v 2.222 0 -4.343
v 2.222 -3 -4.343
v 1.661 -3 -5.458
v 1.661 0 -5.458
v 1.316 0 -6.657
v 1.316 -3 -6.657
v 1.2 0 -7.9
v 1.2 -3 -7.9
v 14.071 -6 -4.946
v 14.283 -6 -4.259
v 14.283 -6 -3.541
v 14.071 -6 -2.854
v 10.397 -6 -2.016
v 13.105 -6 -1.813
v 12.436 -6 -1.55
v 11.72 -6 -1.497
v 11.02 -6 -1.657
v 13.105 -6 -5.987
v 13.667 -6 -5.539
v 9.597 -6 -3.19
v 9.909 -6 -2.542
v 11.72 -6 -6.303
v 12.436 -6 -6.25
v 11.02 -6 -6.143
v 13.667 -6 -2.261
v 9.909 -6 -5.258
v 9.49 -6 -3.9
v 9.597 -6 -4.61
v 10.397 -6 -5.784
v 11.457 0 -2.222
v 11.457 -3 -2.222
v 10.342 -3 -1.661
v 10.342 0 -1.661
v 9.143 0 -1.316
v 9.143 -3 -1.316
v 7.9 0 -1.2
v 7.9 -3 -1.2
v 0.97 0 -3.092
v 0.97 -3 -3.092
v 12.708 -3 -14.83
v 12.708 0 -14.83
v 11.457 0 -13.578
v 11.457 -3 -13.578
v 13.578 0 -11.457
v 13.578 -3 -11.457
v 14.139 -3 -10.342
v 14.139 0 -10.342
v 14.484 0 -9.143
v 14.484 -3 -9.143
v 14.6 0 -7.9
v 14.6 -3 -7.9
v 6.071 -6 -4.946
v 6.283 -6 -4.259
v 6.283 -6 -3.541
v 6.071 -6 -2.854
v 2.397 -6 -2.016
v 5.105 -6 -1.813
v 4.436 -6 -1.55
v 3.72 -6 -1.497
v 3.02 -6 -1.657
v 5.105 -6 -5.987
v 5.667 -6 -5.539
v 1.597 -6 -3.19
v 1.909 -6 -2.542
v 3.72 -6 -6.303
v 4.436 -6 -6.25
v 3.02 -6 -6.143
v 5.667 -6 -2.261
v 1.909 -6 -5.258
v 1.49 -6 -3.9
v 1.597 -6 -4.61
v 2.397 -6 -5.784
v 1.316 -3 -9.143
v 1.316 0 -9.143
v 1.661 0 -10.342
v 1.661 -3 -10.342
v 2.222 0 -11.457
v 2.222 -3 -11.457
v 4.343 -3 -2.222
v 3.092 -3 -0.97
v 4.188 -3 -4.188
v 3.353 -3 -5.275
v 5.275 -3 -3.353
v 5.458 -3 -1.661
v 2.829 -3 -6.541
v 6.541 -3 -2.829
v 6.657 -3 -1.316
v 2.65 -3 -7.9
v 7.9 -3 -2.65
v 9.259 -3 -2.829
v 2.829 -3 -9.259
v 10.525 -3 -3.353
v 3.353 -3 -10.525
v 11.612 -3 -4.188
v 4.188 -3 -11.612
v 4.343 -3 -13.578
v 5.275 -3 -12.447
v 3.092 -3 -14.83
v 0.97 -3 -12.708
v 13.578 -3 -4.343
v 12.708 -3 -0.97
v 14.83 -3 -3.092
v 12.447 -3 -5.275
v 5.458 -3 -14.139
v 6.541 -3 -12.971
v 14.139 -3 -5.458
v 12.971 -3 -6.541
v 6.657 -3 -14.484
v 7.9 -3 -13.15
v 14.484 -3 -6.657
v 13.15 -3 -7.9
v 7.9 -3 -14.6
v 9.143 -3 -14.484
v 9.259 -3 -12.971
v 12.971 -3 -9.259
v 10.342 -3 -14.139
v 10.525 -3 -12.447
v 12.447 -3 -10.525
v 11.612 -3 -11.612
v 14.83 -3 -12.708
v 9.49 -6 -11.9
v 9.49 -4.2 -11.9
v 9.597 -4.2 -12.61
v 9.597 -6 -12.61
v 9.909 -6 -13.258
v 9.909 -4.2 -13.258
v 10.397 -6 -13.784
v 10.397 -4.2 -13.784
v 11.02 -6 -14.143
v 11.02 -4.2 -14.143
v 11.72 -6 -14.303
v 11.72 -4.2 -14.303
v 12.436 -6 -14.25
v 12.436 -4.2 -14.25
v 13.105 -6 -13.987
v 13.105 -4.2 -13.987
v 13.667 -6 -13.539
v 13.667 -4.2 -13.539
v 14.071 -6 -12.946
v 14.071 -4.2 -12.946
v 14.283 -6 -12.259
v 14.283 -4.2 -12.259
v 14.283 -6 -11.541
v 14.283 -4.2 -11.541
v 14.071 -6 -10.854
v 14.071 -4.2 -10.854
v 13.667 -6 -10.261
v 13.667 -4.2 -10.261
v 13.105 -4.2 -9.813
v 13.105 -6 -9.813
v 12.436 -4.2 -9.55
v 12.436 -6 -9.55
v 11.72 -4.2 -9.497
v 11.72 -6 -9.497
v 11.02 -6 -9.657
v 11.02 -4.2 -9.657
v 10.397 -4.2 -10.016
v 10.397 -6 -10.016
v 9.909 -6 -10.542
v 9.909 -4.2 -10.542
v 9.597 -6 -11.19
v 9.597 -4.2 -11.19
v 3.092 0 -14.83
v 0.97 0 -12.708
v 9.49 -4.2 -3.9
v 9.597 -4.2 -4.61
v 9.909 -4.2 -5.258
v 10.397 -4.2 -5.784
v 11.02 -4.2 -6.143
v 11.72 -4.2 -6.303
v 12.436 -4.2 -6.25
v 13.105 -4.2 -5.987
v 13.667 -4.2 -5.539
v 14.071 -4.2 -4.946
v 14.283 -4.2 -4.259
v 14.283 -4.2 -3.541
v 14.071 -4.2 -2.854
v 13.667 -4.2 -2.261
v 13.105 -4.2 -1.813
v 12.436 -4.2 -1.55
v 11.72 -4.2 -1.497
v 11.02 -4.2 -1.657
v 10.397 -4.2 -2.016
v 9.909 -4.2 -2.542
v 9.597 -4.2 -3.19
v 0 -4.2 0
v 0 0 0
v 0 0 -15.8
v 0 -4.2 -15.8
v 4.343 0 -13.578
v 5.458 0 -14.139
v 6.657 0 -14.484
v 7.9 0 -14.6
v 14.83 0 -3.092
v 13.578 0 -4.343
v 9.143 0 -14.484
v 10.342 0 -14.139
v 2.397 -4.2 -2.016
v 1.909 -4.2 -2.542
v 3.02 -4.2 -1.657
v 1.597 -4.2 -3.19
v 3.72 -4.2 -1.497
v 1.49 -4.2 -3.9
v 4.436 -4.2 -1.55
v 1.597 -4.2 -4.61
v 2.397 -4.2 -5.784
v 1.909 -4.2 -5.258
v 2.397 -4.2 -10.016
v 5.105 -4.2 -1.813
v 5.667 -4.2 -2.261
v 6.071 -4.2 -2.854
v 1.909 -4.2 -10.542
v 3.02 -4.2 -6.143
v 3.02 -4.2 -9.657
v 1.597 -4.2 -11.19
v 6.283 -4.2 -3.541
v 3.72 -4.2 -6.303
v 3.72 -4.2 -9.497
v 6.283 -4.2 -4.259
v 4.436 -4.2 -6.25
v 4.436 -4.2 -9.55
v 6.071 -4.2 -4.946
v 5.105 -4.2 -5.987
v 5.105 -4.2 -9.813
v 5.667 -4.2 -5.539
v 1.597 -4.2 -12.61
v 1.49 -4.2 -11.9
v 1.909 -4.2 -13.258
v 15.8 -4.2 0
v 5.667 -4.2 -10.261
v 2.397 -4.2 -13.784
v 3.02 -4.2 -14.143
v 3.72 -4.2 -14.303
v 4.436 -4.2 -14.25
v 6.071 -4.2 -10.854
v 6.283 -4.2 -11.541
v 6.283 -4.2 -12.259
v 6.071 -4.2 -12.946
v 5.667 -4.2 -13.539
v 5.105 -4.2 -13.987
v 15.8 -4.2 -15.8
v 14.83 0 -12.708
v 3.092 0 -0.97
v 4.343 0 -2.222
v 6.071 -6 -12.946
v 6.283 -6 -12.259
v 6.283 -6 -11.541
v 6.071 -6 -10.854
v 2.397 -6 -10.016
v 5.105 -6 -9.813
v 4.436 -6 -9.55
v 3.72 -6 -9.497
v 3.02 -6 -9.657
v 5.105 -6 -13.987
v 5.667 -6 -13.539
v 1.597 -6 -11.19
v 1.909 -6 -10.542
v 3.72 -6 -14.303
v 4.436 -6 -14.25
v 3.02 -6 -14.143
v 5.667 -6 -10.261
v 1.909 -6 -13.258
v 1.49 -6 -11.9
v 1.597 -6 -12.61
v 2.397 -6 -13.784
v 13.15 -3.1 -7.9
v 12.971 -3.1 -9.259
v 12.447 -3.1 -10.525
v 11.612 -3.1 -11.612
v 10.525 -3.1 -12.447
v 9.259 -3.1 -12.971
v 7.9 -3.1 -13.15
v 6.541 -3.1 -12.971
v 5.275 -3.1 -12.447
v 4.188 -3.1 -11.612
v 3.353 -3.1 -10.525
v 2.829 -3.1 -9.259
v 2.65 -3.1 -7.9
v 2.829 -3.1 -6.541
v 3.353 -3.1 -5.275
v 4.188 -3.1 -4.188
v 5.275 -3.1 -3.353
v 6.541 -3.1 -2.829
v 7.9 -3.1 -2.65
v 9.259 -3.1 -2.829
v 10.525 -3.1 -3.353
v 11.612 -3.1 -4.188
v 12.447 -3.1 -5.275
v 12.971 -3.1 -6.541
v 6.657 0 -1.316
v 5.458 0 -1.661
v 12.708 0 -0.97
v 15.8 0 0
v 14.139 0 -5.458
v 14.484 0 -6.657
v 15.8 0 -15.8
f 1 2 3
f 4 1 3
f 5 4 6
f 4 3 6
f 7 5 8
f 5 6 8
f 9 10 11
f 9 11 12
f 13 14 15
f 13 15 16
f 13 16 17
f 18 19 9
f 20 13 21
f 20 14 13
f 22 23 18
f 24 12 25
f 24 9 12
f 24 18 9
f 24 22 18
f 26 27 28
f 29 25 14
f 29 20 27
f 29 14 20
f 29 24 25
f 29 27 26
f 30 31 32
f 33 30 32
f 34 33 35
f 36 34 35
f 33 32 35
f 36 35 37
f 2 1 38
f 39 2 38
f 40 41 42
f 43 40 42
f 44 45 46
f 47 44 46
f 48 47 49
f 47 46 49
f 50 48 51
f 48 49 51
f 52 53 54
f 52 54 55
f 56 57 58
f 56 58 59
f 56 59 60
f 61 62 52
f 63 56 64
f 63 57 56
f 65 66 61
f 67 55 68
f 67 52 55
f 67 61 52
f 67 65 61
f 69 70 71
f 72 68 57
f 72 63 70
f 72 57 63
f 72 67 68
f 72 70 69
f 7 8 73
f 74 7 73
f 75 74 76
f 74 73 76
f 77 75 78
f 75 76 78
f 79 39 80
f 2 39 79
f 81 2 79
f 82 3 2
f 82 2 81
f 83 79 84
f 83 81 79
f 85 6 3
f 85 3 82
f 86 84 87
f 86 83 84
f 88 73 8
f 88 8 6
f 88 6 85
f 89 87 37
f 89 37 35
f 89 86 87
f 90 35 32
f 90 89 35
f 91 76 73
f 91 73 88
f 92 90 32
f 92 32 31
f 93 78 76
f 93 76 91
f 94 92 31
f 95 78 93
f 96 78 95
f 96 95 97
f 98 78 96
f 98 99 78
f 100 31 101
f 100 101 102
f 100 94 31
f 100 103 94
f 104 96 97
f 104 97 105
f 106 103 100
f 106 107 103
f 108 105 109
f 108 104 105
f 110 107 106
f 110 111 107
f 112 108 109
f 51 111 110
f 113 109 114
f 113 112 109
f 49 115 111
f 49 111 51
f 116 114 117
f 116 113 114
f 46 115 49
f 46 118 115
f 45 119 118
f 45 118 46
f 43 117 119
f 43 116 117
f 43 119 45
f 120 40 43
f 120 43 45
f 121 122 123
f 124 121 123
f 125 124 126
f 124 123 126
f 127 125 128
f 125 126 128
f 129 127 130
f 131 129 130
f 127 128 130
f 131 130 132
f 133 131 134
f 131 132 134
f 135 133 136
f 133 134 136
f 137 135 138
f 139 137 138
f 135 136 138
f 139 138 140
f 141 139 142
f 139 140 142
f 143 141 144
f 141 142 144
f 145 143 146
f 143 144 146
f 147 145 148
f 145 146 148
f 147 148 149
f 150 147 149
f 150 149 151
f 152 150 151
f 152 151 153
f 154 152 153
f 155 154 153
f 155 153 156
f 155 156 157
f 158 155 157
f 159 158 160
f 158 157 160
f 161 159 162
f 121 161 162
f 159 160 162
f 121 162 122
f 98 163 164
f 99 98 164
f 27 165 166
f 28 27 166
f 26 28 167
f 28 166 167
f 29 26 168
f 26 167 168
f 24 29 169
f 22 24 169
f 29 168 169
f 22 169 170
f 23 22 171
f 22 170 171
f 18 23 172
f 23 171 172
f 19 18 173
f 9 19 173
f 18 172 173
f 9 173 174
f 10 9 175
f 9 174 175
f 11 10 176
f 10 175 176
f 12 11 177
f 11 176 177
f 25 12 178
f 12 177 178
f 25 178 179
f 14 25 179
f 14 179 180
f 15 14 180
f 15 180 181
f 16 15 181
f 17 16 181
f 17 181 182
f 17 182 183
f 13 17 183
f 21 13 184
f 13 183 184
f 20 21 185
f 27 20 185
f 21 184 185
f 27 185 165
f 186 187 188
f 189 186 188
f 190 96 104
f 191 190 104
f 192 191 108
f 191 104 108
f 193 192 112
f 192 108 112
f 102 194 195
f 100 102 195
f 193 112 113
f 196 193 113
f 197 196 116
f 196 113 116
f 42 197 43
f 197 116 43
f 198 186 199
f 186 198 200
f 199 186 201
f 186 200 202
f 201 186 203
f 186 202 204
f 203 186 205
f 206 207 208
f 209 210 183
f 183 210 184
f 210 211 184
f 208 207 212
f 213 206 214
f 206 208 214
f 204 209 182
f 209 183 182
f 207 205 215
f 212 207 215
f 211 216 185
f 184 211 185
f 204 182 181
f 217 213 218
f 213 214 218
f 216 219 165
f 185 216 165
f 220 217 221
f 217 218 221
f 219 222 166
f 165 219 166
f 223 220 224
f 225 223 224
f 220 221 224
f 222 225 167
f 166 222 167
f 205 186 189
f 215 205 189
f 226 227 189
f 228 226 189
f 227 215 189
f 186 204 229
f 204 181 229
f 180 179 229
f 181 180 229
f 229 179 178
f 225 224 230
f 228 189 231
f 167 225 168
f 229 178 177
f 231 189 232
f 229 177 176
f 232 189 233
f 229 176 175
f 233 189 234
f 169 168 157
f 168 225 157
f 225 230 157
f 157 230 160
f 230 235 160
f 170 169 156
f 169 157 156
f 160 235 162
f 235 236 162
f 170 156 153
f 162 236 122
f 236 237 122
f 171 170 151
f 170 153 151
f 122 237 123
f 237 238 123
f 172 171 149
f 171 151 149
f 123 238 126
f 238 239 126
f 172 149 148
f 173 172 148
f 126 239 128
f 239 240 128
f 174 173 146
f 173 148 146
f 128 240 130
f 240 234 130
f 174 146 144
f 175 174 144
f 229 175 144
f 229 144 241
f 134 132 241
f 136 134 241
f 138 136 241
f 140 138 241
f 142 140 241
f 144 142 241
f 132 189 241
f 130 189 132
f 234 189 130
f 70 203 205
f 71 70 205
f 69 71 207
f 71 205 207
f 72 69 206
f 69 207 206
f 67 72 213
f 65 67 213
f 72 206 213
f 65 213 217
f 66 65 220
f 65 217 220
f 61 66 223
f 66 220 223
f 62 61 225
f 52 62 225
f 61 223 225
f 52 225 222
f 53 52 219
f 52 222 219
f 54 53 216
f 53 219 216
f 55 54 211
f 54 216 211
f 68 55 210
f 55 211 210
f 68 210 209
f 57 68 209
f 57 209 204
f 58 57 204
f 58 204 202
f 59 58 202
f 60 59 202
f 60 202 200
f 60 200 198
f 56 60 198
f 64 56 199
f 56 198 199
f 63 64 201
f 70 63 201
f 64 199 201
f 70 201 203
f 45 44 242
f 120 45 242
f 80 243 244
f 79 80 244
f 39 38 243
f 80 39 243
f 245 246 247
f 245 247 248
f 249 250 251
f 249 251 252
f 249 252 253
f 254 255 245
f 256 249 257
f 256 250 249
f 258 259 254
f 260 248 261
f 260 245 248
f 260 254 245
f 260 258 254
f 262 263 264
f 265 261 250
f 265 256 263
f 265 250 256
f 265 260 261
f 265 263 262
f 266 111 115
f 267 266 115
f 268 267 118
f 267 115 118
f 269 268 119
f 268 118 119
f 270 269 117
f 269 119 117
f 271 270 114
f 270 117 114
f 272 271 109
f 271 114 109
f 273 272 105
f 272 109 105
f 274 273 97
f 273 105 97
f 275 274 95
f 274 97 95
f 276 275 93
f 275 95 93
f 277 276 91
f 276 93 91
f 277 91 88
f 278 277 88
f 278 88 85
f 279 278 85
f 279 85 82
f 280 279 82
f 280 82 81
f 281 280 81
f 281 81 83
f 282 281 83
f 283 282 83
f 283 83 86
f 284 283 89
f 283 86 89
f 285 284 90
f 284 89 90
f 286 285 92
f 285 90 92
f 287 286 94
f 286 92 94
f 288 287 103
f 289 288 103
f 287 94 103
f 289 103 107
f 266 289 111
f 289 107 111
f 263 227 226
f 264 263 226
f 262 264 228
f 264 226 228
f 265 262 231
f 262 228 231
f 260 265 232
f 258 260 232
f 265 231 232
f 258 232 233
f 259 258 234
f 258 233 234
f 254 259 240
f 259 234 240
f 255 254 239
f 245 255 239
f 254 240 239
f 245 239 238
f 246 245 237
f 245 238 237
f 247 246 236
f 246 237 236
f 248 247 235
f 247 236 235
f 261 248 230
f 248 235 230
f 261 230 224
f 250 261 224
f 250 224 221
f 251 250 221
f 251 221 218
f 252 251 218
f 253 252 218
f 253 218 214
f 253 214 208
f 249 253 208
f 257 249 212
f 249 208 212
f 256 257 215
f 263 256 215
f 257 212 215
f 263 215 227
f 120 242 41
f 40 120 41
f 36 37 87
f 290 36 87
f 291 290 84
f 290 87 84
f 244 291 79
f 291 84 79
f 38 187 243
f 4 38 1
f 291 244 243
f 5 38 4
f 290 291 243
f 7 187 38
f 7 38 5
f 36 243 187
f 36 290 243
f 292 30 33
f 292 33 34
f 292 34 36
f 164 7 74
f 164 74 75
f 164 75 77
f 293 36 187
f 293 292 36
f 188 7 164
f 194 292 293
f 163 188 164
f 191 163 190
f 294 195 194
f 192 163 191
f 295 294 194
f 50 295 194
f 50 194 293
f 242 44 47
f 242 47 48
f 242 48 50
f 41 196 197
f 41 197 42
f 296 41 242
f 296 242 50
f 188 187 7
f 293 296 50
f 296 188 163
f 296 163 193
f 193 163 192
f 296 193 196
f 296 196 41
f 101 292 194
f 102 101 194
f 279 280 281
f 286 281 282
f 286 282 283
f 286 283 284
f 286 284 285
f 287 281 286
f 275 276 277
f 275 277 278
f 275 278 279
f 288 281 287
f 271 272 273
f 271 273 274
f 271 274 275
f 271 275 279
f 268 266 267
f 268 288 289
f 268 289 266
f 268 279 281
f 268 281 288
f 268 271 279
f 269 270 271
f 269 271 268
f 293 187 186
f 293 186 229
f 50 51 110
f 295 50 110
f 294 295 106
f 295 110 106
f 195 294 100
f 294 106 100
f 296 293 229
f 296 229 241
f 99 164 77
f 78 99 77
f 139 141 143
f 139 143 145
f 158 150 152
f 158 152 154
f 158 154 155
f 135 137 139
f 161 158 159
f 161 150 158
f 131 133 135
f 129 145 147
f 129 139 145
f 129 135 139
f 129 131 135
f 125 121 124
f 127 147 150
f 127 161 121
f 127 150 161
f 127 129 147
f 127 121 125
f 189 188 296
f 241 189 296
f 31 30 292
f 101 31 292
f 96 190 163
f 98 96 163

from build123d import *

# Parameters (mm, degrees)
SKETCH2_W            = 15.8
SKETCH2_H            = 15.8
BOSS_EXTRUDE2_DEPTH  = 4.2
SKETCH4_W            = 13.4
SKETCH4_H            = 13.4
CUT_EXTRUDE1_DEPTH   = 3
SKETCH6_R            = 2.41
BOSS_EXTRUDE4_DEPTH  = 1.8
LPATTERN1_COUNT      = 2
LPATTERN1_PITCH      = 8
LPATTERN1_COUNT_DIR2 = 2
LPATTERN1_PITCH_DIR2 = 8
SKETCH8_R            = 5.25
CUT_EXTRUDE2_DEPTH   = 0.1
BOSS_EXTRUDE9_DEPTH  = 3
CUT_EXTRUDE3_DEPTH   = 3
CIRPATTERN3_COUNT    = 4


with BuildPart() as part:
    # Sketch2 → Boss-Extrude2 (new body)
    with BuildSketch(Plane(origin=(0, 0, 0), x_dir=(1, 0, 0), z_dir=(0, 1, 0))):
        with Locations((7.9, 7.9)):
            Rectangle(SKETCH2_W, SKETCH2_H)
    extrude(amount=-BOSS_EXTRUDE2_DEPTH)

    # Sketch4 → Cut-Extrude1 (cut)
    with BuildSketch(Plane(origin=(0, 0, 0), x_dir=(1, 0, 0), z_dir=(0, 1, 0))):
        with Locations((7.9, 7.9)):
            Rectangle(SKETCH4_W, SKETCH4_H)
    extrude(amount=-CUT_EXTRUDE1_DEPTH, mode=Mode.SUBTRACT)

    # Sketch6 → Boss-Extrude4 (add)
    with BuildSketch(Plane(origin=(0, -4.2, 0), x_dir=(-1, 0, 0), z_dir=(0, -1, 0))):
        with Locations((-11.9, 11.9)):
            Circle(SKETCH6_R)
    boss_extrude4 = extrude(amount=BOSS_EXTRUDE4_DEPTH)

    # LPattern1: Boss-Extrude4 2 × 2
    with Locations(*[(-j * LPATTERN1_PITCH_DIR2, 0, i * LPATTERN1_PITCH) for i in range(LPATTERN1_COUNT) for j in range(LPATTERN1_COUNT_DIR2) if (i, j) != (0, 0)]):
        add(boss_extrude4)

    # Sketch8 → Cut-Extrude2 (cut)
    with BuildSketch(Plane(origin=(0, -3, 0), x_dir=(1, 0, 0), z_dir=(0, 1, 0))):
        with Locations((7.9, 7.9)):
            Circle(SKETCH8_R)
    extrude(amount=-CUT_EXTRUDE2_DEPTH, mode=Mode.SUBTRACT)

    # Sketch11 → Boss-Extrude9 (add)
    with BuildSketch(Plane(origin=(0, -3, 0), x_dir=(1, 0, 0), z_dir=(0, 1, 0))):
        with BuildLine():
            Line((7.899999971, 14.6), (1.2, 14.6))
            Line((1.2, 14.6), (1.2, 7.9))
            ThreePointArc((1.2, 7.9), (3.162384556, 12.637615424), (7.899999971, 14.6))
        make_face()
        with BuildLine():
            Line((14.6, 14.6), (7.899999971, 14.6))
            ThreePointArc((7.899999971, 14.6), (12.637615424, 12.637615444), (14.6, 7.9))
            Line((14.6, 7.9), (14.6, 14.6))
        make_face()
        with BuildLine():
            ThreePointArc((7.900000011, 1.2), (3.16238457, 3.162384562), (1.2, 7.9))
            Line((1.2, 7.9), (1.2, 1.2))
            Line((1.2, 1.2), (7.900000011, 1.2))
        make_face()
        with BuildLine():
            Line((14.6, 1.2), (14.6, 7.9))
            ThreePointArc((14.6, 7.9), (12.637615438, 3.16238457), (7.900000011, 1.2))
            Line((7.900000011, 1.2), (14.6, 1.2))
        make_face()
    extrude(amount=BOSS_EXTRUDE9_DEPTH)

    # Sketch12 → Cut-Extrude3 (cut)
    with BuildSketch(Plane(origin=(0, 0, 0), x_dir=(1, 0, 0), z_dir=(0, 1, 0))):
        Polygon((3.162384566, 12.637615434), (2.031013716, 13.768986284), (0.970353544, 12.708326112), (2.101724394, 11.576955262), align=None)
        with BuildLine():
            ThreePointArc((2.221981276, 11.45669838), (2.658816927, 12.073727351), (3.162384566, 12.637615434))
            Line((3.162384566, 12.637615434), (2.101724394, 11.576955262))
            Line((2.101724394, 11.576955262), (2.221981276, 11.45669838))
        make_face()
        with BuildLine():
            Line((4.223044738, 13.698275606), (3.162384566, 12.637615434))
            ThreePointArc((3.162384566, 12.637615434), (3.726272649, 13.141183073), (4.34330162, 13.578018724))
            Line((4.34330162, 13.578018724), (4.223044738, 13.698275606))
        make_face()
        Polygon((3.091673888, 14.829646456), (2.031013716, 13.768986284), (3.162384566, 12.637615434), (4.223044738, 13.698275606), align=None)
        with BuildLine():
            ThreePointArc((4.34330162, 13.578018724), (3.726272649, 13.141183073), (3.162384566, 12.637615434))
            ThreePointArc((3.162384566, 12.637615434), (2.658816927, 12.073727351), (2.221981276, 11.45669838))
            Line((2.221981276, 11.45669838), (2.423581348, 11.255098309))
            Line((2.423581348, 11.255098309), (4.544901691, 13.376418652))
            Line((4.544901691, 13.376418652), (4.34330162, 13.578018724))
        make_face()
        with BuildLine():
            ThreePointArc((14.6, 7.9), (11.145005458, 13.761735202), (4.34330162, 13.578018724))
            Line((4.34330162, 13.578018724), (4.544901691, 13.376418652))
            Line((4.544901691, 13.376418652), (2.423581348, 11.255098309))
            Line((2.423581348, 11.255098309), (2.221981276, 11.45669838))
            ThreePointArc((2.221981276, 11.45669838), (6.049692654, 1.460561925), (14.6, 7.9))
        make_face()
    cut_extrude3 = extrude(amount=-CUT_EXTRUDE3_DEPTH, mode=Mode.SUBTRACT)

    # CirPattern3: Cut-Extrude3 ×4 about axis
    cirpattern3_axis = Axis((7.9, 0, -7.9), (0, 1, 0))
    for i in range(1, CIRPATTERN3_COUNT):
        add(cut_extrude3.rotate(cirpattern3_axis, i * 360 / CIRPATTERN3_COUNT), mode=Mode.SUBTRACT)


solid = part.part
